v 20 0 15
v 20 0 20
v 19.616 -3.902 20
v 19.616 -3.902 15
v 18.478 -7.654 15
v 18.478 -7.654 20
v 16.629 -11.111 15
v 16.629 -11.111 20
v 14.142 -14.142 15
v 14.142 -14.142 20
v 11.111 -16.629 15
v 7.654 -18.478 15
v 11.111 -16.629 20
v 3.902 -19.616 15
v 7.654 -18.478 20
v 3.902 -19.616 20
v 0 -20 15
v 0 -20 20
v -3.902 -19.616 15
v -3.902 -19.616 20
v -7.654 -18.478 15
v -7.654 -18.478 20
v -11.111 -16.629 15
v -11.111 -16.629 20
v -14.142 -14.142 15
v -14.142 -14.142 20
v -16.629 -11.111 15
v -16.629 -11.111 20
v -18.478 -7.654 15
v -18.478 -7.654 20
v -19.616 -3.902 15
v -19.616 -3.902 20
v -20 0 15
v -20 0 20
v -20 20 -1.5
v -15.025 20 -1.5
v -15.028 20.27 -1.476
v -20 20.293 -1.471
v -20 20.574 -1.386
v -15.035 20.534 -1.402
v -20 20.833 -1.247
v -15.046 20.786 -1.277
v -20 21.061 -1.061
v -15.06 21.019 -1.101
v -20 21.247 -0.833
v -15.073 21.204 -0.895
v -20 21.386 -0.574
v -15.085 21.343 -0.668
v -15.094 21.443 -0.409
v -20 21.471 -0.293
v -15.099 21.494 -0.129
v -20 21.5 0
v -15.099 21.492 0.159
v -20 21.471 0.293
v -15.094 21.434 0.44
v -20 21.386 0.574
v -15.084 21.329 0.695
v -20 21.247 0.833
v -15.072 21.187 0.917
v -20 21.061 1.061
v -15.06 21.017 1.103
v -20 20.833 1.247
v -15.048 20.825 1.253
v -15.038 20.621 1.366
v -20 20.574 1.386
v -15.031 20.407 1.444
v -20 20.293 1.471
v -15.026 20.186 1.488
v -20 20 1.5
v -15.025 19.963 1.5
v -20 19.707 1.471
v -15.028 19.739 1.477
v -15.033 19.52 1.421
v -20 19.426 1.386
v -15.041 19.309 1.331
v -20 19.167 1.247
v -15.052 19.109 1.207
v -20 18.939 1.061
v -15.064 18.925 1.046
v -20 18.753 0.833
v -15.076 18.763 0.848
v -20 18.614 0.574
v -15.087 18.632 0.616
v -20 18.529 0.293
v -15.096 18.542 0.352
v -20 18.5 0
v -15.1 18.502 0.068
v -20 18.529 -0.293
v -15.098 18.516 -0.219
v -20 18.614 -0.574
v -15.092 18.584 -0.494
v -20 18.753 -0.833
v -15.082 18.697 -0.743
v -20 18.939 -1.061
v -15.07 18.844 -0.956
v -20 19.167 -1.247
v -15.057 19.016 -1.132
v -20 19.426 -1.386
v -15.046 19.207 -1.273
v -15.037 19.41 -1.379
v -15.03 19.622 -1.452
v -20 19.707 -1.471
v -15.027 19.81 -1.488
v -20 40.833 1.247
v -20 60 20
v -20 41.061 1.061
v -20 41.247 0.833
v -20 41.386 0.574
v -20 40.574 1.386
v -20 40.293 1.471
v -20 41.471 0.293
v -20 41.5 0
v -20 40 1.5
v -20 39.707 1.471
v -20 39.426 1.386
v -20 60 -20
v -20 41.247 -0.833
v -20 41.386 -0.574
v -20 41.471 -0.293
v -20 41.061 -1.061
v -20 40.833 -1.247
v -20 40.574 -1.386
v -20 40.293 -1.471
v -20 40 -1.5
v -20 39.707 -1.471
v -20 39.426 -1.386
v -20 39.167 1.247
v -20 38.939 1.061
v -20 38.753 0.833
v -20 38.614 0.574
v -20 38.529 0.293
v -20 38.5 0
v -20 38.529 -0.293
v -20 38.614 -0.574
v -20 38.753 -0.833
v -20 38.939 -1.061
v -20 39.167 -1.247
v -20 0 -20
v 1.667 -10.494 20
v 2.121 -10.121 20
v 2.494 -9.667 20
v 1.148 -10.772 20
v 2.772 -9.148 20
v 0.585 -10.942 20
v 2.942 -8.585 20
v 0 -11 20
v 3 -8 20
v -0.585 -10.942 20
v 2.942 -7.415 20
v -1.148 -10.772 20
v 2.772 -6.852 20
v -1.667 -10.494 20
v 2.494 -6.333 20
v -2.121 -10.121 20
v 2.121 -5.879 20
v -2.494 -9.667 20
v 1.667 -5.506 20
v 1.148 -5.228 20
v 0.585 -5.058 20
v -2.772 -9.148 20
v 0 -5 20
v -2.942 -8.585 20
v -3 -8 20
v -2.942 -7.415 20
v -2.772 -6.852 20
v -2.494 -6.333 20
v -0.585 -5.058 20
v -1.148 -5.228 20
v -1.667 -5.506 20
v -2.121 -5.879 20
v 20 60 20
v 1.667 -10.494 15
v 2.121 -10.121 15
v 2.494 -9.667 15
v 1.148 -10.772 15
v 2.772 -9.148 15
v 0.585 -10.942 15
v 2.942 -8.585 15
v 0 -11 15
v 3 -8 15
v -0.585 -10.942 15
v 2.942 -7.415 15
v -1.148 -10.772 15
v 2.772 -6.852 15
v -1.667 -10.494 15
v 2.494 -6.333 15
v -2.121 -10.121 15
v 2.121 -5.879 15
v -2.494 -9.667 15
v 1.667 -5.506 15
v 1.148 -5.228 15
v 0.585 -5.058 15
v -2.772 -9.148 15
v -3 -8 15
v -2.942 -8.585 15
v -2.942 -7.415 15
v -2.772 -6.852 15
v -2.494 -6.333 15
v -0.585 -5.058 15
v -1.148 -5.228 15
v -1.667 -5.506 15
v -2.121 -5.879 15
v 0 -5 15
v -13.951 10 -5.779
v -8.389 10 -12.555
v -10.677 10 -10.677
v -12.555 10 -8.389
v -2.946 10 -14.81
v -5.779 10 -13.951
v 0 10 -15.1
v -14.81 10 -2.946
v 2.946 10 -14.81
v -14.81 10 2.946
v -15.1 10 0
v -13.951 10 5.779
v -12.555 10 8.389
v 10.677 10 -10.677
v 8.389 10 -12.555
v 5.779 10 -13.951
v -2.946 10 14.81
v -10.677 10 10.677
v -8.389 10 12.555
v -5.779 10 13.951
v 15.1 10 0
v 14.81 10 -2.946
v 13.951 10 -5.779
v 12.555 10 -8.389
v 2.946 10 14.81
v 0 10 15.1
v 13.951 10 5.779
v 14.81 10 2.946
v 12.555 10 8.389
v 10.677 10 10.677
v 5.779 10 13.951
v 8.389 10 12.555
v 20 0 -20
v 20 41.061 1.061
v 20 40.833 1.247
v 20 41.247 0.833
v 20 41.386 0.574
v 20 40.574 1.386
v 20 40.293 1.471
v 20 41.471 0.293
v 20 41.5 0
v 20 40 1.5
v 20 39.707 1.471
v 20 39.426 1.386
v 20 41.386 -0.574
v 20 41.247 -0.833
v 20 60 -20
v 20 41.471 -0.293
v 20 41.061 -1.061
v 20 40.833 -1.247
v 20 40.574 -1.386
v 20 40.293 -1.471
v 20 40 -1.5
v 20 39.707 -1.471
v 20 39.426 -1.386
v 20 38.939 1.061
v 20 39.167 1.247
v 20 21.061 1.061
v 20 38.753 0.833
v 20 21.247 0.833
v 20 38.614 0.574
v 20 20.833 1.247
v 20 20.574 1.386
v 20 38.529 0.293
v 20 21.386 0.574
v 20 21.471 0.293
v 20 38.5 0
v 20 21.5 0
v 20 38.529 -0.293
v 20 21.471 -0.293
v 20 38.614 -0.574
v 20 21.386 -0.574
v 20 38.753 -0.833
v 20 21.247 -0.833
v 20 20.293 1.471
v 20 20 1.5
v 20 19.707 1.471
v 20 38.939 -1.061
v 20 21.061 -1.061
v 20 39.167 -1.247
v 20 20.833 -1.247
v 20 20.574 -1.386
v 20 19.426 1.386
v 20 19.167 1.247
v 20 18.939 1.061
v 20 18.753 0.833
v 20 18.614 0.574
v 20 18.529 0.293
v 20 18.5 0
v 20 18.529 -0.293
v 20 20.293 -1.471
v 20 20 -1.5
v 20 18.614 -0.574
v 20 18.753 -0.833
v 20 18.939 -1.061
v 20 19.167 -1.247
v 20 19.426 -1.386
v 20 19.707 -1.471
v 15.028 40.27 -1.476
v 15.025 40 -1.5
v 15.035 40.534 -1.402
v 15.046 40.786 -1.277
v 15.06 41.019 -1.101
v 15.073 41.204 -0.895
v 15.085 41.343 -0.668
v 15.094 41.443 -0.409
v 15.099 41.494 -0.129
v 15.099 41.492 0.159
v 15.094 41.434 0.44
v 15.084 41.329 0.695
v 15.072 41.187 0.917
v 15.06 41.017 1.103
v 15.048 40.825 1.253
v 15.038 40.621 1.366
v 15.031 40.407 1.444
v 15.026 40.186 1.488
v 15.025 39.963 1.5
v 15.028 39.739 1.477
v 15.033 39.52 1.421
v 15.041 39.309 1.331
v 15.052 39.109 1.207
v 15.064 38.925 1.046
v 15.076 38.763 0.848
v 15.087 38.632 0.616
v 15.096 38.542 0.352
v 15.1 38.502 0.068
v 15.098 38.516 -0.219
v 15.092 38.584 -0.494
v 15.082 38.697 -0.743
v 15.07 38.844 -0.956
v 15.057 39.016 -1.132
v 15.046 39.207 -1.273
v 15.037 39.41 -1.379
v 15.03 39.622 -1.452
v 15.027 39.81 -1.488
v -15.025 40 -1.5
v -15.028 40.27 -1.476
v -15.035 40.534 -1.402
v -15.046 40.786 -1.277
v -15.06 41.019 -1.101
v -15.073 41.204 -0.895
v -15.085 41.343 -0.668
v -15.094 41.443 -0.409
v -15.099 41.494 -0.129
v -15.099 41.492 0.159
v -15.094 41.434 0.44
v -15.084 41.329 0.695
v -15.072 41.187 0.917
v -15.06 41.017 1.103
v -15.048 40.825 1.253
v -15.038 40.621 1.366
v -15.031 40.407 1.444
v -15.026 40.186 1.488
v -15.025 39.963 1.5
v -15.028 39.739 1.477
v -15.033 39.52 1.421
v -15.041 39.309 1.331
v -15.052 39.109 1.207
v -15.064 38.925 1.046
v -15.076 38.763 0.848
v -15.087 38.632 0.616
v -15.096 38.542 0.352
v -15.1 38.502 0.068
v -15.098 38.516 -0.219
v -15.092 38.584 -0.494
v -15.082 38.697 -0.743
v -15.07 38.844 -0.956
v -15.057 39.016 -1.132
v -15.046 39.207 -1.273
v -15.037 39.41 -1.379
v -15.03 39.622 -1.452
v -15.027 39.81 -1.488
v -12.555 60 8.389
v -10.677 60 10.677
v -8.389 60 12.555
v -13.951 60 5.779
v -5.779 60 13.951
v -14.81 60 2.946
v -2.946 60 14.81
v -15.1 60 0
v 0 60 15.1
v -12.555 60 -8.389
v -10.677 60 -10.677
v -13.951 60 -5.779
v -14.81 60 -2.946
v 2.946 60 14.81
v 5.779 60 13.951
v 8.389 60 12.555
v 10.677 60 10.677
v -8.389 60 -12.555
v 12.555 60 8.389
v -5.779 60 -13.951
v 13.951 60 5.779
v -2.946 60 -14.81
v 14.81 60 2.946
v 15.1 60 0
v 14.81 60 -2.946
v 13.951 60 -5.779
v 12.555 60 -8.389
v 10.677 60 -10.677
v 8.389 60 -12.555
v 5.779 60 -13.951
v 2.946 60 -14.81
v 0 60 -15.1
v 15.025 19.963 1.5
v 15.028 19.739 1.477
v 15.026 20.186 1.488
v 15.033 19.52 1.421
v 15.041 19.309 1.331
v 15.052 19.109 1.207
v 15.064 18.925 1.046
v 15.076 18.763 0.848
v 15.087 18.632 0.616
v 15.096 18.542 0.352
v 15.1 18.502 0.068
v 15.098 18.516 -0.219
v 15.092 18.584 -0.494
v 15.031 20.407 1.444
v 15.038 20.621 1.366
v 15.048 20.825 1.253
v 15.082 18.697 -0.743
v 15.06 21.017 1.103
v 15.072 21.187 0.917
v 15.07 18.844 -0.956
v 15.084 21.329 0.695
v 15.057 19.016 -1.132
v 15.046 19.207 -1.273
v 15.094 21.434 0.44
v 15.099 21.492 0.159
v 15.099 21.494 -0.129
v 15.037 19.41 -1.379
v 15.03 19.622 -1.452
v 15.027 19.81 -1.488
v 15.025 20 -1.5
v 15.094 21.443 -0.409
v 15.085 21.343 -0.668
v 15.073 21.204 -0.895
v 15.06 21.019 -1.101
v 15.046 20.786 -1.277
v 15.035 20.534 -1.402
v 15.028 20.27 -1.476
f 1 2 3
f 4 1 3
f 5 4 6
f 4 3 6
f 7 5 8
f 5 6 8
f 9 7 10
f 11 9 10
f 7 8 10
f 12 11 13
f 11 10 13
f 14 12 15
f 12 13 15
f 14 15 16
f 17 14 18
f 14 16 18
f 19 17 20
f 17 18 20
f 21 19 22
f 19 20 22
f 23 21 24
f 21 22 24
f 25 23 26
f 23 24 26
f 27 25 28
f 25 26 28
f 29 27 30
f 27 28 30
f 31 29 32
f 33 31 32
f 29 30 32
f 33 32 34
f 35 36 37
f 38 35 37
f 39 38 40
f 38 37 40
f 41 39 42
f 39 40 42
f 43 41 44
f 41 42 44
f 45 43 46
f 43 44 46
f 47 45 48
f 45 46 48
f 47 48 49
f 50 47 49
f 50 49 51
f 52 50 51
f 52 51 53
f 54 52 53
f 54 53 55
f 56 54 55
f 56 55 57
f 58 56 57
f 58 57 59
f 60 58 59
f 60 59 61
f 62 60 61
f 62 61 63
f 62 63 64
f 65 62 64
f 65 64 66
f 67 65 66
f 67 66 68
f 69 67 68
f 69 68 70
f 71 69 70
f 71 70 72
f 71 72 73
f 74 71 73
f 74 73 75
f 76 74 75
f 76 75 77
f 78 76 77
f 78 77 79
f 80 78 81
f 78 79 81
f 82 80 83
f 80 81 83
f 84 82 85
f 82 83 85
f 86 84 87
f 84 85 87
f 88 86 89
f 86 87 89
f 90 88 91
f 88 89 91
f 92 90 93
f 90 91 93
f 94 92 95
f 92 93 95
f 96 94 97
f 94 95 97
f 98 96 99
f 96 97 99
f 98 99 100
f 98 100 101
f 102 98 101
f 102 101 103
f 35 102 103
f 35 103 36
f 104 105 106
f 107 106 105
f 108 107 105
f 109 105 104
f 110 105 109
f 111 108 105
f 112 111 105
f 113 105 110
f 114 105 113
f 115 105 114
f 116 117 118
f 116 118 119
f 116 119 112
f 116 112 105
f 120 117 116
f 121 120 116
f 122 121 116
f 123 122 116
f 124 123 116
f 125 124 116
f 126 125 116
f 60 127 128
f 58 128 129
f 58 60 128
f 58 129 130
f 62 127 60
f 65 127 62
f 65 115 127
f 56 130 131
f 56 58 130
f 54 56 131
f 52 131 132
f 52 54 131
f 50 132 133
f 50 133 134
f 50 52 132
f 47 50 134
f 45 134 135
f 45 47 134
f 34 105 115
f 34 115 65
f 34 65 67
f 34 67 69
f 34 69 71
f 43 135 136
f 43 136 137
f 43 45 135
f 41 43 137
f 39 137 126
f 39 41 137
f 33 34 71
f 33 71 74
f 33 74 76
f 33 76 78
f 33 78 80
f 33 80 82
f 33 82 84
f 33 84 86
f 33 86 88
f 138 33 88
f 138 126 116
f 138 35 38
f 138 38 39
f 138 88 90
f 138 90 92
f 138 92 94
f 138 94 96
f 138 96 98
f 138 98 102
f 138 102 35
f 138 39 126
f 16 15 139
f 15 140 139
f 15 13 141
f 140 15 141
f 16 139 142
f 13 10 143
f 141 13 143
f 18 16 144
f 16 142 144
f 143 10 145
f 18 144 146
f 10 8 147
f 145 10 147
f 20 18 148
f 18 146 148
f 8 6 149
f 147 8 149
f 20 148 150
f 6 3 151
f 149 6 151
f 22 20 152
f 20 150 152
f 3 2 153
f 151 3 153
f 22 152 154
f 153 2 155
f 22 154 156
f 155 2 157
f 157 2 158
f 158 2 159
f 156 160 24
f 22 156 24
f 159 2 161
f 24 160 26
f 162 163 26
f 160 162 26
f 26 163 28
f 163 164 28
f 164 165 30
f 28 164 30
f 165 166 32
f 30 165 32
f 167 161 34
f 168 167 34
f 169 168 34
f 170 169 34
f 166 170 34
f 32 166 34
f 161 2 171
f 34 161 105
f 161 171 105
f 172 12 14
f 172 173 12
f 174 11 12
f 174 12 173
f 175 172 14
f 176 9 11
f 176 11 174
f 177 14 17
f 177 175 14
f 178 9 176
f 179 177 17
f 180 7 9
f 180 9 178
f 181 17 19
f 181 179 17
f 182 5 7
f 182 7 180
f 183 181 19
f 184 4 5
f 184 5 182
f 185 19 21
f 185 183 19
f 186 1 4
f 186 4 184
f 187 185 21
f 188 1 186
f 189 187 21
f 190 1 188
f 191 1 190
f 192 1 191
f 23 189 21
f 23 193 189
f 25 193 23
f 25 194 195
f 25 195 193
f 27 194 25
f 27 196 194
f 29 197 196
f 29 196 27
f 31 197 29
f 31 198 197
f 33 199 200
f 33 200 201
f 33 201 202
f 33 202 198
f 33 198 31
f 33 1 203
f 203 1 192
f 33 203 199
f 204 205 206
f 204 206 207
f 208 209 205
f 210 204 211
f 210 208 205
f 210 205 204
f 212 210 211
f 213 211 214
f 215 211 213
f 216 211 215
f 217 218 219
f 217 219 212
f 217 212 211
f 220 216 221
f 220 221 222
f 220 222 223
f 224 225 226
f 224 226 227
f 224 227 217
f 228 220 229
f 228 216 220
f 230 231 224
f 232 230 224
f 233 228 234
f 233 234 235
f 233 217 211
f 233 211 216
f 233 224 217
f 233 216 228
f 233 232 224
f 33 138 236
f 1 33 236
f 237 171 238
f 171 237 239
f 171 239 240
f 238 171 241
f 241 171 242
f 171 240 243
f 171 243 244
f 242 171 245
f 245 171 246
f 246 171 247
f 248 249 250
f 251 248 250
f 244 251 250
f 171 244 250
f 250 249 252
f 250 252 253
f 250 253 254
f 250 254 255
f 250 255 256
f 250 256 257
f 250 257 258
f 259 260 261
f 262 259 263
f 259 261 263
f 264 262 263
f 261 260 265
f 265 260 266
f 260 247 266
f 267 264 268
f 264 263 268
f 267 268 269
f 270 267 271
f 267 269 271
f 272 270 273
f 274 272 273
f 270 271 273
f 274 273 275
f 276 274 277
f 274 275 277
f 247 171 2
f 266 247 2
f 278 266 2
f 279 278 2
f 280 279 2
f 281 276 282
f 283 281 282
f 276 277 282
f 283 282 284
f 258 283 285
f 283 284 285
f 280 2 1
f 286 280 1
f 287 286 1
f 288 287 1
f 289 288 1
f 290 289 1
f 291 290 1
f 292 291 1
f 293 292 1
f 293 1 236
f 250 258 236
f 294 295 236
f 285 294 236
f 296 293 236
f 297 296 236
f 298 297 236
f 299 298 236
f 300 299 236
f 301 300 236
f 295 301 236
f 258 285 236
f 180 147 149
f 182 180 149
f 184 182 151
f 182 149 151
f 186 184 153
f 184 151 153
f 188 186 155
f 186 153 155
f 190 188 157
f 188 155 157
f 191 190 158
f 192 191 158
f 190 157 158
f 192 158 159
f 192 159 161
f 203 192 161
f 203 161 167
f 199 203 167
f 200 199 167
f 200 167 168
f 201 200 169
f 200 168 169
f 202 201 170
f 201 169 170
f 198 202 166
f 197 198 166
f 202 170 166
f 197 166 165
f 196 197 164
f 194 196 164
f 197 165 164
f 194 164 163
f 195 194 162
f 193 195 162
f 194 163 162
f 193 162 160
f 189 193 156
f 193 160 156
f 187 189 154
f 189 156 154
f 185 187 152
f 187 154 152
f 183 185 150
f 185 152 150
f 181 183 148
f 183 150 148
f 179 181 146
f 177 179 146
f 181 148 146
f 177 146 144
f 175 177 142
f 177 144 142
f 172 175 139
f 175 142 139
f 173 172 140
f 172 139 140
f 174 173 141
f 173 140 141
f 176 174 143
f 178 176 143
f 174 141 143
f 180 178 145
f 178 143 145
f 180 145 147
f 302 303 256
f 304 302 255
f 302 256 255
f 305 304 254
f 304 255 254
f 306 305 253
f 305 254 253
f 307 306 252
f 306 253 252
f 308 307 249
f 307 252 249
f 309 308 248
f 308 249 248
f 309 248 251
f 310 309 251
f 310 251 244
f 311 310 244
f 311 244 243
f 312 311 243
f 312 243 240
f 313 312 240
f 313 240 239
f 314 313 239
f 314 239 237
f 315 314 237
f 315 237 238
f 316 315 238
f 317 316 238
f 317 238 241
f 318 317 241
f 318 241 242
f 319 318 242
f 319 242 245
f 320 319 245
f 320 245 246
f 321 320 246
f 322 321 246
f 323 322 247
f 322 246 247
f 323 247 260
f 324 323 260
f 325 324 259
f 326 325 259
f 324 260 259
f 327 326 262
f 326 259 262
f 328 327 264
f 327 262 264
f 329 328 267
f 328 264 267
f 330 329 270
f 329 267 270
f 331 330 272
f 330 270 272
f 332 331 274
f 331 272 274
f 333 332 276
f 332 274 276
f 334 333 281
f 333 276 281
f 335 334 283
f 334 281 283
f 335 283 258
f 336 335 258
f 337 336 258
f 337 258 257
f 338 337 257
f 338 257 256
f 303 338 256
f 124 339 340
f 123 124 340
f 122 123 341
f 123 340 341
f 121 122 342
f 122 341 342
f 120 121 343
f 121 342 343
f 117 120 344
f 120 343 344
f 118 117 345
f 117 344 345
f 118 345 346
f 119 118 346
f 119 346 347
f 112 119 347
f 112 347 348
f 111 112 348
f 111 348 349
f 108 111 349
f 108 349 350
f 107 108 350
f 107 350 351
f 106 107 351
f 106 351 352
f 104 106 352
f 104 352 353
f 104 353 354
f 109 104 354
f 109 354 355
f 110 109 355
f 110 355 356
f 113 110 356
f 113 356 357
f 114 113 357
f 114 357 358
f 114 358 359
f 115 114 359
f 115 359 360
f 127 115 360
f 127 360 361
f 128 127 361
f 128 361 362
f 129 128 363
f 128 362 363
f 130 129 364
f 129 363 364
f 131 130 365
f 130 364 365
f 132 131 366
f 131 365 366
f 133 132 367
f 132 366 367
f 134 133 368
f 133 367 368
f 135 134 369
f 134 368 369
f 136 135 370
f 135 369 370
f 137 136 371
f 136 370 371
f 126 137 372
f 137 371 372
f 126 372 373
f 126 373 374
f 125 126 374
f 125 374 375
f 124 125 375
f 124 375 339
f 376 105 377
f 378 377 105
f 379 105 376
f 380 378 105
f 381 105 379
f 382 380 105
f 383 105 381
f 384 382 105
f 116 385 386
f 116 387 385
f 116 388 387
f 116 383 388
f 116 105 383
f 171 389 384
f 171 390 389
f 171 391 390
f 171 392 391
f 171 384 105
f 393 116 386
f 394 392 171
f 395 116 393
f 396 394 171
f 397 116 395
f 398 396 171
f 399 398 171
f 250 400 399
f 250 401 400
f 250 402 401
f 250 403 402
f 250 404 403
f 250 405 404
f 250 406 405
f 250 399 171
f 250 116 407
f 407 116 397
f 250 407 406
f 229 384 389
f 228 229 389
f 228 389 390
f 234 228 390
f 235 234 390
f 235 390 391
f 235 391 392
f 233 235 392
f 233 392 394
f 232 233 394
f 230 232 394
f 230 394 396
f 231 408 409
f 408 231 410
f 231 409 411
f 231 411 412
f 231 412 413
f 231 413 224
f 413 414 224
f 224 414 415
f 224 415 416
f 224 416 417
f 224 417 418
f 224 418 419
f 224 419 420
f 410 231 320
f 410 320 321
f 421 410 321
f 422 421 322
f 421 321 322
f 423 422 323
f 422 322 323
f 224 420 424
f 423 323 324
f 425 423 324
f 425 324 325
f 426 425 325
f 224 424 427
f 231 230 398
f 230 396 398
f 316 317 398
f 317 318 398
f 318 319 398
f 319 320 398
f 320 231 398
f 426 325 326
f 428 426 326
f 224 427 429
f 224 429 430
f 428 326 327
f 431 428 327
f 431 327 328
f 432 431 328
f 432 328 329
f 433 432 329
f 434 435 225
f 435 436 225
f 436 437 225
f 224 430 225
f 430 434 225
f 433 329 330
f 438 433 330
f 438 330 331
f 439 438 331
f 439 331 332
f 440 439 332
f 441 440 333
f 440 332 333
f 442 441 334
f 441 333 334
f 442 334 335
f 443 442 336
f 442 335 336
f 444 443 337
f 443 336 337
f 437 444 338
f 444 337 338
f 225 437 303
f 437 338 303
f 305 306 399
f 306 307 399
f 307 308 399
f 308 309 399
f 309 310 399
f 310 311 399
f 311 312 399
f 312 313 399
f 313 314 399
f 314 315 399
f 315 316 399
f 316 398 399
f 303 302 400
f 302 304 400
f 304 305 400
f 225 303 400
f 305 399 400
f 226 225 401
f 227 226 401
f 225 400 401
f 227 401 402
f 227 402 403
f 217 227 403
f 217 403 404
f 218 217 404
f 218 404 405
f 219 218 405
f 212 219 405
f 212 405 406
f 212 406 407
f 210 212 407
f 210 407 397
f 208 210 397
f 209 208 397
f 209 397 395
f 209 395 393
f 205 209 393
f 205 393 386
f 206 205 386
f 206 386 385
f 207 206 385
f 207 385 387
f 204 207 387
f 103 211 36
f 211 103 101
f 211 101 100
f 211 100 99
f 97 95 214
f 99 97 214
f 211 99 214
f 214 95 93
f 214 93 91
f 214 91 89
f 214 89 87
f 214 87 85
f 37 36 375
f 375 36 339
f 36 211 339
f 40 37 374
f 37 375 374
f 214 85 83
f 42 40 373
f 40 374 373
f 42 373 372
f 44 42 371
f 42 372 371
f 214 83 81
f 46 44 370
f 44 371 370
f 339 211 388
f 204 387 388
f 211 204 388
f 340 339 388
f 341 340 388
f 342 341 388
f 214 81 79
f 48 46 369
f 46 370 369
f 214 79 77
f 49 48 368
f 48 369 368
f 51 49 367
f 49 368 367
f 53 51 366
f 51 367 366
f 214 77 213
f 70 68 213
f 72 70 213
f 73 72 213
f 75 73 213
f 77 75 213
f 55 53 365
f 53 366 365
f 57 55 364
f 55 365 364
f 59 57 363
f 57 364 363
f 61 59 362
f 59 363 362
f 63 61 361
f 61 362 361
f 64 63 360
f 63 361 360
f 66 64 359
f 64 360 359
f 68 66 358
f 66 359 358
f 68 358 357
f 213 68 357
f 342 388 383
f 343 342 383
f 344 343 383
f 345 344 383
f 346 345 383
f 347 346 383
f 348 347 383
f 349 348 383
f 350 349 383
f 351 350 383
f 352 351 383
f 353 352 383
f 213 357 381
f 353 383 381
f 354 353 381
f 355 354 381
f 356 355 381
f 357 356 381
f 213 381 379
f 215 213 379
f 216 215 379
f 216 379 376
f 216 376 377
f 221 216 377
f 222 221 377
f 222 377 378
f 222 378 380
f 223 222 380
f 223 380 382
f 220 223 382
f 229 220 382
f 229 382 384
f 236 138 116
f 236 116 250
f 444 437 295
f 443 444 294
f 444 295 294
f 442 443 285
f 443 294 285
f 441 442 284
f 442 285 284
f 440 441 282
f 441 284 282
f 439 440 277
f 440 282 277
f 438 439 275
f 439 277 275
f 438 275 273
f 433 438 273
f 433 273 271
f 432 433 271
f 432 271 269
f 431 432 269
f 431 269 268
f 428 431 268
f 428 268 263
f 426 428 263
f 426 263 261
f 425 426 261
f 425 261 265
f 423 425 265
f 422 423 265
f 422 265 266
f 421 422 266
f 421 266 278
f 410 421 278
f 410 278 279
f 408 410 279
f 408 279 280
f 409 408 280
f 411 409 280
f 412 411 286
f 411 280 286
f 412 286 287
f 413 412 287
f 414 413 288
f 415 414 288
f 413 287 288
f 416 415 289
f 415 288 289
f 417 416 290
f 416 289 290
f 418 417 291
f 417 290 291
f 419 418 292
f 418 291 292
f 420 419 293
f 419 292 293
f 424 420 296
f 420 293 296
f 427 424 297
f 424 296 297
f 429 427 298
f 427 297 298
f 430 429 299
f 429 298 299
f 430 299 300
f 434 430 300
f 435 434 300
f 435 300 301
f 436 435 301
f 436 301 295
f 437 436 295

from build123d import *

# Parameters (mm, degrees)
SKETCH_1_W             = 40
SKETCH_1_H             = 40
EXTRUDE_1_DEPTH        = 60
SKETCH_2_R             = 15.1
CUT_EXTRUDE_1_DEPTH    = 50
SKETCH_3_R             = 3
EXTRUDE_2_DEPTH        = 5
SKETCH_4_R             = 1.5
CUT_EXTRUDE_2_DEPTH    = 75.833147735
PATTERN_LINEAR_1_COUNT = 2
PATTERN_LINEAR_1_PITCH = 20


with BuildPart() as part:
    # 草圖1 → 填料-伸長1 (new body)
    with BuildSketch(Plane(origin=(0, 0, 0), x_dir=(1, 0, 0), z_dir=(0, 1, 0))):
        Rectangle(SKETCH_1_W, SKETCH_1_H)
    extrude(amount=EXTRUDE_1_DEPTH)

    # 草圖2 → 除料-伸長1 (cut)
    with BuildSketch(Plane(origin=(0, 60, 0), x_dir=(1, 0, 0), z_dir=(0, 1, 0))):
        with Locations(Location((0, 0, 0), (0, 0, 270))):
            Circle(SKETCH_2_R)
    extrude(amount=-CUT_EXTRUDE_1_DEPTH, mode=Mode.SUBTRACT)

    # 草圖3 → 填料-伸長2 (add)
    with BuildSketch(Plane.XY.offset(20)):
        with BuildLine():
            Line((-20, 0), (20, 0))
            ThreePointArc((20, 0), (0, -20), (-20, 0))
        make_face()
        with Locations((0, -8)):
            Circle(SKETCH_3_R, mode=Mode.SUBTRACT)
    extrude(amount=-EXTRUDE_2_DEPTH)

    # 草圖4 → 除料-伸長2 (cut, through all)
    with BuildSketch(Plane(origin=(20, 0, 0), x_dir=(0, 0, -1), z_dir=(1, 0, 0))):
        with Locations((0, 20)):
            Circle(SKETCH_4_R)
    cut_extrude_2 = extrude(amount=-CUT_EXTRUDE_2_DEPTH, mode=Mode.SUBTRACT)

    # 直線複製排列1: 除料-伸長2 ×2
    with Locations(*[(0, i * PATTERN_LINEAR_1_PITCH, 0) for i in range(1, PATTERN_LINEAR_1_COUNT)]):
        add(cut_extrude_2, mode=Mode.SUBTRACT)


solid = part.part
